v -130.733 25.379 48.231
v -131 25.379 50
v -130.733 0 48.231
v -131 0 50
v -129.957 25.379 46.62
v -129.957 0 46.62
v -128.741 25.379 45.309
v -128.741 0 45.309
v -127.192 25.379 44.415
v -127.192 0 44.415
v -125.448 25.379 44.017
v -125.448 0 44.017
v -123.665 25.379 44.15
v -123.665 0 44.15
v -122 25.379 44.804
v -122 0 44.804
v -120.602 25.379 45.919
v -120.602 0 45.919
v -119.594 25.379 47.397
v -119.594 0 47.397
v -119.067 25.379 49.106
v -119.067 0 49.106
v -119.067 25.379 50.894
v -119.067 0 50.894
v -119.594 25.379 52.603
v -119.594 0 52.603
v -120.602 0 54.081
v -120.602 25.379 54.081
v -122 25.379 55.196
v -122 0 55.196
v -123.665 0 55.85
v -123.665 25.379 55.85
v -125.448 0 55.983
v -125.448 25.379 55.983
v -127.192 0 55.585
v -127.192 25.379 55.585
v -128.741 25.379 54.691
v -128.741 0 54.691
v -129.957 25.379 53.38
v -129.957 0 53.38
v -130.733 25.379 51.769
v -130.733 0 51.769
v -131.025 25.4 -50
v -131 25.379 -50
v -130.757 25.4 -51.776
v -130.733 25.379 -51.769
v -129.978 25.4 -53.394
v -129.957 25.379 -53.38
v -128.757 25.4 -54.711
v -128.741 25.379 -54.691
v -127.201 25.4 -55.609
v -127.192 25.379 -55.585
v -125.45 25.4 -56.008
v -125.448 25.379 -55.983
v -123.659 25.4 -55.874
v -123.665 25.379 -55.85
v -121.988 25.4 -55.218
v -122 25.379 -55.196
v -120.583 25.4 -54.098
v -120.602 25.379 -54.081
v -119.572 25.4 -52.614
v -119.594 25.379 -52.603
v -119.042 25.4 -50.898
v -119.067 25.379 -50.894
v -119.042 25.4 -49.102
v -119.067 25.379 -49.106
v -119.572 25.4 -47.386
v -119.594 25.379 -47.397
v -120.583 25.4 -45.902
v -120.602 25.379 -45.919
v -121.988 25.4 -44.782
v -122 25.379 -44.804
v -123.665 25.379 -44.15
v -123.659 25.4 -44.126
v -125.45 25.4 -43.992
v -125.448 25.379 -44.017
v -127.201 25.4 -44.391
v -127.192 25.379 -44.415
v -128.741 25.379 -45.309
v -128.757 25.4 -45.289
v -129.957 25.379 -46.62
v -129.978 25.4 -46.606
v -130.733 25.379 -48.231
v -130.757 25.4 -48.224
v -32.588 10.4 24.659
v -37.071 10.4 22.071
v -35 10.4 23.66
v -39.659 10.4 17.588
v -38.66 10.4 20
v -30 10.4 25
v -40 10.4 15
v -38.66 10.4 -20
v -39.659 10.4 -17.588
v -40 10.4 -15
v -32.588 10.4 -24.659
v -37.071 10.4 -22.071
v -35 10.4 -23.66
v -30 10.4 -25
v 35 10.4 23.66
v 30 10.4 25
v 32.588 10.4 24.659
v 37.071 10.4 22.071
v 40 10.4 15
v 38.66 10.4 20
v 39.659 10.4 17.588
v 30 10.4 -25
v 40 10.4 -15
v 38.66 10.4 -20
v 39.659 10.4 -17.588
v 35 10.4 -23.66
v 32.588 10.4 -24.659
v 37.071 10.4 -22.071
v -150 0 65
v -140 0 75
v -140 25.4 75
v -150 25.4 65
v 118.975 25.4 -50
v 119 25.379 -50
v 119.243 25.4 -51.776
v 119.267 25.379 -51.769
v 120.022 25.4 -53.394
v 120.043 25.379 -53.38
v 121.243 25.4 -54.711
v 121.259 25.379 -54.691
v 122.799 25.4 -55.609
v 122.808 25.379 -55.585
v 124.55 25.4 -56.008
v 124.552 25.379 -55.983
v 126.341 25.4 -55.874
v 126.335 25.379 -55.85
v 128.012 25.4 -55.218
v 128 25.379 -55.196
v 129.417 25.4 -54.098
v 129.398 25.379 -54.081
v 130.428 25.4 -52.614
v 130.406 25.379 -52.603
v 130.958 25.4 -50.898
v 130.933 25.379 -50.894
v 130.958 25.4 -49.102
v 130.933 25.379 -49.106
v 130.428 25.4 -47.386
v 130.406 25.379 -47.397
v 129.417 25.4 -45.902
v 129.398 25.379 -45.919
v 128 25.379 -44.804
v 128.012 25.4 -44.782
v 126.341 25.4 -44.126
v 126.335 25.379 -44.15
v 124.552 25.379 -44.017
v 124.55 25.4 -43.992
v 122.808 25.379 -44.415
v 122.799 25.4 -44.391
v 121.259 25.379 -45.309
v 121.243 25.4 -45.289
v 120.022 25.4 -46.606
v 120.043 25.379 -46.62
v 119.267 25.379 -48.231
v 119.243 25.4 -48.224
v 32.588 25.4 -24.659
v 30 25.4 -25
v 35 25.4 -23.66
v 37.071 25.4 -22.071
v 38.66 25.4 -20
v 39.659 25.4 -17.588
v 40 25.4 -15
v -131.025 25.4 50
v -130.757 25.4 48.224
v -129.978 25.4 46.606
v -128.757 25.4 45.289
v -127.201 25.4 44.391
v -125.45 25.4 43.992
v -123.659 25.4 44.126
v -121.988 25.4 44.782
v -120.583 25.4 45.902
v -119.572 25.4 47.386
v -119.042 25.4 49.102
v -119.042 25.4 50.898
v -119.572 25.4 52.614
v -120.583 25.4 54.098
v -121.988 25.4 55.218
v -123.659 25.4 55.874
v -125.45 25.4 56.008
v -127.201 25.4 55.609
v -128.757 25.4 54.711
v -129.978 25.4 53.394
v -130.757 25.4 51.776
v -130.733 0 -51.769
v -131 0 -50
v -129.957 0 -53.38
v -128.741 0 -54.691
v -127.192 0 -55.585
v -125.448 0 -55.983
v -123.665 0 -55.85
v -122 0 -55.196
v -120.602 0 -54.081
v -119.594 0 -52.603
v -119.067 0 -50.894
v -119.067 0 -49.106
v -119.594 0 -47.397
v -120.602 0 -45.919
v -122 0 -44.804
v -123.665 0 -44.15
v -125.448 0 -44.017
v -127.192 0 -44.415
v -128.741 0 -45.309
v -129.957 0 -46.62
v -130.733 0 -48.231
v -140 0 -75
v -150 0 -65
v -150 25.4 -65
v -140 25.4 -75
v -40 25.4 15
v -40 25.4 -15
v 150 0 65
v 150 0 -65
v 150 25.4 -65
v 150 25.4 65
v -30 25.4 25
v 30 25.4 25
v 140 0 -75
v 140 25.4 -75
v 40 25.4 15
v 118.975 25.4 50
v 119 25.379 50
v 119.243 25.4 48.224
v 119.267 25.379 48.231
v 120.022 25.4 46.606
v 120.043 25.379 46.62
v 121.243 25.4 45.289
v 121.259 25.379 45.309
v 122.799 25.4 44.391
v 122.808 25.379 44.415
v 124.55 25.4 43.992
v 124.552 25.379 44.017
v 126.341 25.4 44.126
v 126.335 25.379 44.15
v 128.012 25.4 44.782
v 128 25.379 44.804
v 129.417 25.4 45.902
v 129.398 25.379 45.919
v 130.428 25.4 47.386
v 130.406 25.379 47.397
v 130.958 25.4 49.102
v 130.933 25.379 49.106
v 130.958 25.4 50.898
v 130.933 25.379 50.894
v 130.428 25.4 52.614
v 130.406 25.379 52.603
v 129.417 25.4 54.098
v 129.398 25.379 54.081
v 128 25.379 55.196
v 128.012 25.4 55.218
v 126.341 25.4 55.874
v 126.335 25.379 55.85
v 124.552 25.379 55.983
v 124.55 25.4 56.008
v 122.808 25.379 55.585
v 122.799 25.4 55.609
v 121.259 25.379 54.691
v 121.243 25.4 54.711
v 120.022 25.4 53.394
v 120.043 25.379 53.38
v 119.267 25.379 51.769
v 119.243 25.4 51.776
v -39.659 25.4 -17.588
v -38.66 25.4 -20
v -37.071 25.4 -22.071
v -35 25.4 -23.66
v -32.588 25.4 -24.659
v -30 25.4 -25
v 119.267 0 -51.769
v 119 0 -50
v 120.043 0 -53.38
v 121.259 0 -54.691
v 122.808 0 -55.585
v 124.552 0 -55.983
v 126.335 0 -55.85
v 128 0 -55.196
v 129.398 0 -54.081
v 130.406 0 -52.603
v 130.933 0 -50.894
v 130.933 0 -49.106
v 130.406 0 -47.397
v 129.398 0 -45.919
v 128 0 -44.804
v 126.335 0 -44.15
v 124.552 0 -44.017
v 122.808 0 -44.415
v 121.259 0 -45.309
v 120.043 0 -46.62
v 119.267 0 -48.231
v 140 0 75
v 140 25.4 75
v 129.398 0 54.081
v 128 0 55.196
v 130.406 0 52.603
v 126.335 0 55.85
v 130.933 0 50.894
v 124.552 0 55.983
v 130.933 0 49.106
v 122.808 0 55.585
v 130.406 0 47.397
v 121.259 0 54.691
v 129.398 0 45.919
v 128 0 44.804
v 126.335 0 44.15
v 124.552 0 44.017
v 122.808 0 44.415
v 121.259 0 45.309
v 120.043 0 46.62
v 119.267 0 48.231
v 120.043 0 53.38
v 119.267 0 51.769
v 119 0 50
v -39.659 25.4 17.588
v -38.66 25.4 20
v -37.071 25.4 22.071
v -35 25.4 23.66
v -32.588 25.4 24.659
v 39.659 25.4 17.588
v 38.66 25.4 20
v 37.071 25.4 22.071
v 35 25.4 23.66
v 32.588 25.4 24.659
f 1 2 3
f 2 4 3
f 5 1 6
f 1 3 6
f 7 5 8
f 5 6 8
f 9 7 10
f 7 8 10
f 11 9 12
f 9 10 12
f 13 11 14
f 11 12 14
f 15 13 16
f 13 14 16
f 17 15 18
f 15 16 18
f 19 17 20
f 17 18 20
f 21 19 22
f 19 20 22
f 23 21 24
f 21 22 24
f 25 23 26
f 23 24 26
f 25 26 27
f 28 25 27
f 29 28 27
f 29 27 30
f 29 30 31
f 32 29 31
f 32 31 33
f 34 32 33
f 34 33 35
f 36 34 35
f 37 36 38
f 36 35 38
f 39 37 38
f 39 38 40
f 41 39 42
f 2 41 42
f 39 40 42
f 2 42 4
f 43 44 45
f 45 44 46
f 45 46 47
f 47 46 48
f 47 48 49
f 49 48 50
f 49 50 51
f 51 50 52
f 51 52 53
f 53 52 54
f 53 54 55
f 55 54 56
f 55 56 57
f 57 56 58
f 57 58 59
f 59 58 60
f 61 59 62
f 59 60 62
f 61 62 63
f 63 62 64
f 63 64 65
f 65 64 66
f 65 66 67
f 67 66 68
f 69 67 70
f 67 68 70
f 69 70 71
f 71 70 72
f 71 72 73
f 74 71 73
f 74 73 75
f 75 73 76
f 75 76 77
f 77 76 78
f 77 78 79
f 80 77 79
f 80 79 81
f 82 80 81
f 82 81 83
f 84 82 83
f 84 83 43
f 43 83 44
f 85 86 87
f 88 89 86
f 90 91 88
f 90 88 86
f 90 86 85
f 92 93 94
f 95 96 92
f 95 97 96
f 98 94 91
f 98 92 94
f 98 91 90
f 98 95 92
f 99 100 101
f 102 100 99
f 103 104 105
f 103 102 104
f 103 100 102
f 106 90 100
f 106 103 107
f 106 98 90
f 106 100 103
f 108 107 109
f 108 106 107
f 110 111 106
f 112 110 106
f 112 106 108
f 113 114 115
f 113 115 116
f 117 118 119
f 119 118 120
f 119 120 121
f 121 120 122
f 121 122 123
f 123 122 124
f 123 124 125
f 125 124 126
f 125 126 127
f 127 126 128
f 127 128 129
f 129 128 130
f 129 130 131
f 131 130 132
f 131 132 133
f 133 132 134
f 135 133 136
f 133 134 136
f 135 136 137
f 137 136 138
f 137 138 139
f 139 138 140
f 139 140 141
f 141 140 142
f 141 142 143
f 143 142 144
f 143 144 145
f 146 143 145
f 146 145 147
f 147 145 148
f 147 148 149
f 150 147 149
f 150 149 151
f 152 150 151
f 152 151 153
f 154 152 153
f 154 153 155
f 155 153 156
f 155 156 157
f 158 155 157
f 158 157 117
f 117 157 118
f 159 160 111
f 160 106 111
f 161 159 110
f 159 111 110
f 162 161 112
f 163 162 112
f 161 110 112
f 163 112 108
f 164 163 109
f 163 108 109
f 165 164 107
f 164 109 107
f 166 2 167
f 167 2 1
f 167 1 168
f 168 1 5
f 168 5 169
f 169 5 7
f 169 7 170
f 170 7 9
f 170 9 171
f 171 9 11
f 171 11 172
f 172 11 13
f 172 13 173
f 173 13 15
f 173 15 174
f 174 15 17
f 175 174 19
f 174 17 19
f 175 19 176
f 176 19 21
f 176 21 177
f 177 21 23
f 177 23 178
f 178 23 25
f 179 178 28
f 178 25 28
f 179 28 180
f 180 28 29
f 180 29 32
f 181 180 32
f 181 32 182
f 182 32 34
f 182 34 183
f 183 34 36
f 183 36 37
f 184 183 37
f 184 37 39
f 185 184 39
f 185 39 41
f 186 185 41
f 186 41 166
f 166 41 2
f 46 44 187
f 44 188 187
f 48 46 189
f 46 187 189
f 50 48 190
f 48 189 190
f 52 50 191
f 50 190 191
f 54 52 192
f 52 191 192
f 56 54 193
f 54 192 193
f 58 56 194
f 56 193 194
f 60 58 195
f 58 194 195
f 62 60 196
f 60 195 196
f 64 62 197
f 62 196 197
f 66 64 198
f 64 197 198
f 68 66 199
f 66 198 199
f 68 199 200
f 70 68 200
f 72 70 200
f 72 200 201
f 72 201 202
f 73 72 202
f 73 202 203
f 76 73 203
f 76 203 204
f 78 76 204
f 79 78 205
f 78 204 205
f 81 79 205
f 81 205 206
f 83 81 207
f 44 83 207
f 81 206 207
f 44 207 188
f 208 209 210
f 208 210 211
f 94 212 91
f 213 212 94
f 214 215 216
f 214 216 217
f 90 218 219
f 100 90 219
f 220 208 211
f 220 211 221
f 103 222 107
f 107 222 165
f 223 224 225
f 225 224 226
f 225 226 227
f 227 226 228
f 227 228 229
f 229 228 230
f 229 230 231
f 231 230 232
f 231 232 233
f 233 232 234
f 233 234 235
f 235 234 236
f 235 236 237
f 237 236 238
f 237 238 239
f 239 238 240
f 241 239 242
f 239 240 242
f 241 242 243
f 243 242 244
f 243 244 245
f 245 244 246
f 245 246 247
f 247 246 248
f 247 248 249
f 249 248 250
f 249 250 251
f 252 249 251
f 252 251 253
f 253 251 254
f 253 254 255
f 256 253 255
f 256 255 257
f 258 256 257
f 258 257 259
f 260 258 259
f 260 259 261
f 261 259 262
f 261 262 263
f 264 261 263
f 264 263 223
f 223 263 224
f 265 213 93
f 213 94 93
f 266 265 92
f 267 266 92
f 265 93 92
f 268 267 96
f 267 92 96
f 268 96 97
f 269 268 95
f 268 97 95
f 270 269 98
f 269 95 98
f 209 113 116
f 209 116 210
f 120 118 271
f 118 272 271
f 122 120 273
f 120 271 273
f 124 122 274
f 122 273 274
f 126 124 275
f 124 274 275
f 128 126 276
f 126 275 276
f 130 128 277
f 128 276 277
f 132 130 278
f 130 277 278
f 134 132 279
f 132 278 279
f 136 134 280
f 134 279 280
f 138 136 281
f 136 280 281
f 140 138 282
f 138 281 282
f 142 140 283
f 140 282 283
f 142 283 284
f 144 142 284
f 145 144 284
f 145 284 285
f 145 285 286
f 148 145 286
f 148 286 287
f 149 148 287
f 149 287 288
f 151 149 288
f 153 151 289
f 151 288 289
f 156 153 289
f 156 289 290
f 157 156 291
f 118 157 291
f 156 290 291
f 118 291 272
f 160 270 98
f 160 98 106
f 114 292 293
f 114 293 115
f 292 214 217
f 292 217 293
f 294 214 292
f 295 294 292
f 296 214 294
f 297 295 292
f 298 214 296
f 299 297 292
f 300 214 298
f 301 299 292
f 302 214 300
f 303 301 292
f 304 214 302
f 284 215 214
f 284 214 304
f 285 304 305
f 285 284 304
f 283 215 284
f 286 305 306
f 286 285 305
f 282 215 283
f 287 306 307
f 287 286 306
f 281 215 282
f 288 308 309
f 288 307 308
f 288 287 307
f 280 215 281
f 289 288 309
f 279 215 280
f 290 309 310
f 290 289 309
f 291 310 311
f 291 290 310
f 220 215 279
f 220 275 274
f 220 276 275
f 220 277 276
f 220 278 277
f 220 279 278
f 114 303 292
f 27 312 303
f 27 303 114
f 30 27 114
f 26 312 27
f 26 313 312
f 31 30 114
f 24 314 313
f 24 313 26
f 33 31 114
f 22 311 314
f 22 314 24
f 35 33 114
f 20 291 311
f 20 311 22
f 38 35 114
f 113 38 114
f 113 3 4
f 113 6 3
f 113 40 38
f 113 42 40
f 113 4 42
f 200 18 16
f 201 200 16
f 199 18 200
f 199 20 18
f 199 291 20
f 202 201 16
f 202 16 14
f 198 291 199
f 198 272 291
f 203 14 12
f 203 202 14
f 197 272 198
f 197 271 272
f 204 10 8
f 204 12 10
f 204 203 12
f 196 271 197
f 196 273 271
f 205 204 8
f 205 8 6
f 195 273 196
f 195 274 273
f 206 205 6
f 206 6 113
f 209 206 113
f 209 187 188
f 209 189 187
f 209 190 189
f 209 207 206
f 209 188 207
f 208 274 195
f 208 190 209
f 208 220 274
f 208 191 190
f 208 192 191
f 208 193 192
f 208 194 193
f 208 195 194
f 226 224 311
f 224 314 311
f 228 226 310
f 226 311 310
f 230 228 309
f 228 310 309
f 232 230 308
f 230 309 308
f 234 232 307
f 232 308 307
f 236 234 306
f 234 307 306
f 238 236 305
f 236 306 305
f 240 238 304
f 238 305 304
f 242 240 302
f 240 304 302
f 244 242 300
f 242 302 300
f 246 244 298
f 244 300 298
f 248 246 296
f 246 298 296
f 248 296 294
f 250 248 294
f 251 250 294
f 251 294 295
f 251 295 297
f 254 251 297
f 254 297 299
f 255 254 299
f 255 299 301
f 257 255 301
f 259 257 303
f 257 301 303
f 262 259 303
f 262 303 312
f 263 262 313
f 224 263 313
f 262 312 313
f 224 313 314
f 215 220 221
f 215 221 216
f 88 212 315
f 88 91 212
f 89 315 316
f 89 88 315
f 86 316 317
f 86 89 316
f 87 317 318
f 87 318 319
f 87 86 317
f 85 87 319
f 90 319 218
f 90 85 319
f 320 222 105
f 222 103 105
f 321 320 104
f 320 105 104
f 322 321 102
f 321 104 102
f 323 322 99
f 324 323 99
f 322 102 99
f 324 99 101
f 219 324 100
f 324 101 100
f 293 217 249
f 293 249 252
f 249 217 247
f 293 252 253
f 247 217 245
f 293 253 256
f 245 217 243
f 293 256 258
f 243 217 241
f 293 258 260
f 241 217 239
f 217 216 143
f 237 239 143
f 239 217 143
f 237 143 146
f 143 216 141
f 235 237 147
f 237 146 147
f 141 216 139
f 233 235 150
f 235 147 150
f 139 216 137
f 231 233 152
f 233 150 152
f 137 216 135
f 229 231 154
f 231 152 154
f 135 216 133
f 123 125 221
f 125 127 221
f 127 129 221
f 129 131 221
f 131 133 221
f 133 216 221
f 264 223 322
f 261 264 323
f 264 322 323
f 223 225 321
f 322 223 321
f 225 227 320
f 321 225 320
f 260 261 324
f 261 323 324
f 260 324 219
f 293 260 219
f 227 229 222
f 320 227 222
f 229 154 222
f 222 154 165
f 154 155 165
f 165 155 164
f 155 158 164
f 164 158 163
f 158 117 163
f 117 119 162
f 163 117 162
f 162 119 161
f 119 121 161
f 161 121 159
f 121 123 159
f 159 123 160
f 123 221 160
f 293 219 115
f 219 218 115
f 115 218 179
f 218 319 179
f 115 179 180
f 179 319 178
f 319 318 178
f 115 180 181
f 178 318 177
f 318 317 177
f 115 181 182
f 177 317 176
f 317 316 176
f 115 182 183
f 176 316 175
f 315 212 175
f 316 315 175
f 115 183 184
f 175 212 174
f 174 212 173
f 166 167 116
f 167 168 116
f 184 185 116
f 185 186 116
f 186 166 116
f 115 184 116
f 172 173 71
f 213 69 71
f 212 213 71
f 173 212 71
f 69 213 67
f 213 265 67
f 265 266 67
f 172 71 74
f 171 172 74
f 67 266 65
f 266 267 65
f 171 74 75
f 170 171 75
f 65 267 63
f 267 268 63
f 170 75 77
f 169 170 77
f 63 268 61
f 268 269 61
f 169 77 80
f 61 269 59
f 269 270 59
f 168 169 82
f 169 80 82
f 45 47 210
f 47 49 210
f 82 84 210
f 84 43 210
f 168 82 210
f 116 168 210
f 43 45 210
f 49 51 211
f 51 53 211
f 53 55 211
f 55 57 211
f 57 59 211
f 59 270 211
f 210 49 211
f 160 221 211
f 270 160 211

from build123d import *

# Parameters (mm, degrees)
BOSS_EXTRUDE1_DEPTH              = 25.4
SKETCH4_W                        = 80
SKETCH4_H                        = 50
CUT_EXTRUDE1_DEPTH               = 15
FILLET1_R                        = 10
F_12_0MM_DOWEL_HOLE1_D           = 12
F_12_0MM_DOWEL_HOLE1_CSINK_D     = 12.05
F_12_0MM_DOWEL_HOLE1_CSINK_ANGLE = 100


with BuildPart() as part:
    # Sketch1 → Boss-Extrude1 (new body)
    with BuildSketch(Plane(origin=(0, 0, 0), x_dir=(1, 0, 0), z_dir=(0, 1, 0))):
        Polygon((-150, 65), (-140, 75), (140, 75), (150, 65), (150, -65), (140, -75), (-140, -75), (-150, -65), align=None)
    extrude(amount=BOSS_EXTRUDE1_DEPTH)

    # Sketch4 → Cut-Extrude1 (cut)
    with BuildSketch(Plane(origin=(0, 25.4, 0), x_dir=(1, 0, 0), z_dir=(0, 1, 0))):
        Rectangle(SKETCH4_W, SKETCH4_H)
    extrude(amount=-CUT_EXTRUDE1_DEPTH, mode=Mode.SUBTRACT)

    # Fillet1
    fillet1_edges = [part.edges().sort_by_distance(p)[0] for p in [
        (40, 17.9, -25),
        (40, 17.9, 25),
        (-40, 17.9, 25),
        (-40, 17.9, -25),
    ]]
    fillet(fillet1_edges, radius=FILLET1_R)

    # Ø12.0mm Dowel Hole1 (through all)
    with Locations(Plane(origin=(0, 25.4, 0), x_dir=(1, 0, 0), z_dir=(0, 1, 0))):
        with Locations((-125, 50), (125, 50), (125, -50), (-125, -50)):
            CounterSinkHole(F_12_0MM_DOWEL_HOLE1_D / 2, F_12_0MM_DOWEL_HOLE1_CSINK_D / 2, counter_sink_angle=F_12_0MM_DOWEL_HOLE1_CSINK_ANGLE)


solid = part.part
